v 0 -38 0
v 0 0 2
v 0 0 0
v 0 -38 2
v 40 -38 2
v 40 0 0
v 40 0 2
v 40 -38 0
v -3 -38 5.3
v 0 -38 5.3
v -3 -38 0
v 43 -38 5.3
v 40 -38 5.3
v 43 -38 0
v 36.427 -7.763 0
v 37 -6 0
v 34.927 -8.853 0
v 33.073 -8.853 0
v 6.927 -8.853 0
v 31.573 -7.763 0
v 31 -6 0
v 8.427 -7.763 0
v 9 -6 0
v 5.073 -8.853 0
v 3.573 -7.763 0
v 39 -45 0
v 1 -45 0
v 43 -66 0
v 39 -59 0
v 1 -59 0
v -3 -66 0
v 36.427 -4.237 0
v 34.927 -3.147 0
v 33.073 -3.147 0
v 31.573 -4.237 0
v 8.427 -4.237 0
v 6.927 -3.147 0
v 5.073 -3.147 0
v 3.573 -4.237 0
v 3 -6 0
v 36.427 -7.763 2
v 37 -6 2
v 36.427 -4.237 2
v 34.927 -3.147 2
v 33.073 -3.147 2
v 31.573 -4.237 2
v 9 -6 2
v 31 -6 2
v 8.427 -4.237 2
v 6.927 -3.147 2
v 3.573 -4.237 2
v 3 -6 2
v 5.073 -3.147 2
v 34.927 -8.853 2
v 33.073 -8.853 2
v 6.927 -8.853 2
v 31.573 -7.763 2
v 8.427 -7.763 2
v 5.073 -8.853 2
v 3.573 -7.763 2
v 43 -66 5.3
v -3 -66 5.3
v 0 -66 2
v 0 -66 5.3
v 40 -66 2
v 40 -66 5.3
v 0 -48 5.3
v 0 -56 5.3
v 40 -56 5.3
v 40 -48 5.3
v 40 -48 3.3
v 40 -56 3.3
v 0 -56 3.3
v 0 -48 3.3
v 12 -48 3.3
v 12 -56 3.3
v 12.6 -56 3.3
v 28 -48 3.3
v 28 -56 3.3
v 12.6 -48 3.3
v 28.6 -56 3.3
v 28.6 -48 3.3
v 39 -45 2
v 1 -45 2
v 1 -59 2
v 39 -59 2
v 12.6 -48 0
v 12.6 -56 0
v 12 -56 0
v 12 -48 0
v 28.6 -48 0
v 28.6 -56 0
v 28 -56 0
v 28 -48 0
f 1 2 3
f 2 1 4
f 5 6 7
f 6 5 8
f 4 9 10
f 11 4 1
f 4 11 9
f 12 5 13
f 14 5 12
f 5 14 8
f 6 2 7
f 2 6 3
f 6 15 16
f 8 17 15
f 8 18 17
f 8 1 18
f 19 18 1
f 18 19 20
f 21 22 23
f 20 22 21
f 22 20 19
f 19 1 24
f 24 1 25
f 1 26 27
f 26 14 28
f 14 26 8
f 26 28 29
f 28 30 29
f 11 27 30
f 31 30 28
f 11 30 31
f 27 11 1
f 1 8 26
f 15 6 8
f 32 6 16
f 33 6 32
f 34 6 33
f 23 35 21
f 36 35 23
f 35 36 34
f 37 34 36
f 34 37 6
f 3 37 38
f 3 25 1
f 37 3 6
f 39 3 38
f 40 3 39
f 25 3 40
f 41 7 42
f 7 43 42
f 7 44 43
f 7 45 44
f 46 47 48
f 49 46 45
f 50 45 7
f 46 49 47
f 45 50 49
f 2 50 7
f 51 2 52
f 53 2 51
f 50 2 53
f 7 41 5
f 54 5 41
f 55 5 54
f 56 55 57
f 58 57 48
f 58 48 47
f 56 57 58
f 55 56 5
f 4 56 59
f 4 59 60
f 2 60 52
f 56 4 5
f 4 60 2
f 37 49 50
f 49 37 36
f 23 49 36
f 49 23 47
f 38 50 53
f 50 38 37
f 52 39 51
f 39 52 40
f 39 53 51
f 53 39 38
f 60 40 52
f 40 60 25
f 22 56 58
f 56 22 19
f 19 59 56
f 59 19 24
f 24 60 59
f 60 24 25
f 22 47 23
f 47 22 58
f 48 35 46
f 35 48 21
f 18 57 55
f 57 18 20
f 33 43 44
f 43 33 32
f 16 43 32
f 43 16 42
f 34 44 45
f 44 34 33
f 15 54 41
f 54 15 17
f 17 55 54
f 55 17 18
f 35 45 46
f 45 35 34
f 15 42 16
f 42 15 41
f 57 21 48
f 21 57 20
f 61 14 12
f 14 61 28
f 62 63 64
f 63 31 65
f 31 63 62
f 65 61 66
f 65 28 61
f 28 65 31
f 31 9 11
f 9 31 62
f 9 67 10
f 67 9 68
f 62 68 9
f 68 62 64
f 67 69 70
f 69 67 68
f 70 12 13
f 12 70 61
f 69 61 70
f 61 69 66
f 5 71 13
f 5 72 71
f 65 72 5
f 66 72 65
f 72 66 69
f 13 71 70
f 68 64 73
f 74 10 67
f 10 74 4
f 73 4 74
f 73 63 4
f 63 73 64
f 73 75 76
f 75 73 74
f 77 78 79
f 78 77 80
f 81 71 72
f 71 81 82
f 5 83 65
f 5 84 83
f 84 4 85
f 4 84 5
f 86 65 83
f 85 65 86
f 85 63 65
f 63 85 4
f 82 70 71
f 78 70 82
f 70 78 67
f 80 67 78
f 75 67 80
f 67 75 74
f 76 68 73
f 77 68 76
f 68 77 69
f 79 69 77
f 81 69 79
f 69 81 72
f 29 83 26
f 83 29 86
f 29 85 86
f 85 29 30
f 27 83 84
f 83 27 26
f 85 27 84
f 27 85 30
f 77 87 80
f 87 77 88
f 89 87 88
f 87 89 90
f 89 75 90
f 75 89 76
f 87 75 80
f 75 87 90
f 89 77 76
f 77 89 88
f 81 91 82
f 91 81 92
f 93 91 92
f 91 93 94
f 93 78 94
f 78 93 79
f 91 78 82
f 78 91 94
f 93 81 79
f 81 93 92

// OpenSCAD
difference(){rotate([90,0,0])
    cube([40,2,38]);
    //main Body of Supporting Slice
rotate([0,0,0])translate([6,-6,0])cylinder(r=3,h=3);
//hole double cap rivet left
rotate([0,0,0])translate([34,-6,0])cylinder(r=3,h=3);
//hole double cap rivet right
}
//the part of slice that support the belt :
rotate([90,0,0])difference(){
translate([-3,0,38])cube([46,5.3,28]);//bridge block with upper side and down side
translate([0,2,38])cube([40,1.3,28]);//space under bridge
translate([0,2,38])cube([40,3.3,10]);//cutoff below the bridge
translate([0,2,56])cube([40,3.3,10]);//cutoff above the bridge
translate([1,0,45])cube([38,2,14]);//cutoff downd the bridge
}
//support for bridge{
translate([12,-56,0])cube([0.6,8,3.3]);
translate([28,-56,0])cube([0.6,8,3.3]);
//}
